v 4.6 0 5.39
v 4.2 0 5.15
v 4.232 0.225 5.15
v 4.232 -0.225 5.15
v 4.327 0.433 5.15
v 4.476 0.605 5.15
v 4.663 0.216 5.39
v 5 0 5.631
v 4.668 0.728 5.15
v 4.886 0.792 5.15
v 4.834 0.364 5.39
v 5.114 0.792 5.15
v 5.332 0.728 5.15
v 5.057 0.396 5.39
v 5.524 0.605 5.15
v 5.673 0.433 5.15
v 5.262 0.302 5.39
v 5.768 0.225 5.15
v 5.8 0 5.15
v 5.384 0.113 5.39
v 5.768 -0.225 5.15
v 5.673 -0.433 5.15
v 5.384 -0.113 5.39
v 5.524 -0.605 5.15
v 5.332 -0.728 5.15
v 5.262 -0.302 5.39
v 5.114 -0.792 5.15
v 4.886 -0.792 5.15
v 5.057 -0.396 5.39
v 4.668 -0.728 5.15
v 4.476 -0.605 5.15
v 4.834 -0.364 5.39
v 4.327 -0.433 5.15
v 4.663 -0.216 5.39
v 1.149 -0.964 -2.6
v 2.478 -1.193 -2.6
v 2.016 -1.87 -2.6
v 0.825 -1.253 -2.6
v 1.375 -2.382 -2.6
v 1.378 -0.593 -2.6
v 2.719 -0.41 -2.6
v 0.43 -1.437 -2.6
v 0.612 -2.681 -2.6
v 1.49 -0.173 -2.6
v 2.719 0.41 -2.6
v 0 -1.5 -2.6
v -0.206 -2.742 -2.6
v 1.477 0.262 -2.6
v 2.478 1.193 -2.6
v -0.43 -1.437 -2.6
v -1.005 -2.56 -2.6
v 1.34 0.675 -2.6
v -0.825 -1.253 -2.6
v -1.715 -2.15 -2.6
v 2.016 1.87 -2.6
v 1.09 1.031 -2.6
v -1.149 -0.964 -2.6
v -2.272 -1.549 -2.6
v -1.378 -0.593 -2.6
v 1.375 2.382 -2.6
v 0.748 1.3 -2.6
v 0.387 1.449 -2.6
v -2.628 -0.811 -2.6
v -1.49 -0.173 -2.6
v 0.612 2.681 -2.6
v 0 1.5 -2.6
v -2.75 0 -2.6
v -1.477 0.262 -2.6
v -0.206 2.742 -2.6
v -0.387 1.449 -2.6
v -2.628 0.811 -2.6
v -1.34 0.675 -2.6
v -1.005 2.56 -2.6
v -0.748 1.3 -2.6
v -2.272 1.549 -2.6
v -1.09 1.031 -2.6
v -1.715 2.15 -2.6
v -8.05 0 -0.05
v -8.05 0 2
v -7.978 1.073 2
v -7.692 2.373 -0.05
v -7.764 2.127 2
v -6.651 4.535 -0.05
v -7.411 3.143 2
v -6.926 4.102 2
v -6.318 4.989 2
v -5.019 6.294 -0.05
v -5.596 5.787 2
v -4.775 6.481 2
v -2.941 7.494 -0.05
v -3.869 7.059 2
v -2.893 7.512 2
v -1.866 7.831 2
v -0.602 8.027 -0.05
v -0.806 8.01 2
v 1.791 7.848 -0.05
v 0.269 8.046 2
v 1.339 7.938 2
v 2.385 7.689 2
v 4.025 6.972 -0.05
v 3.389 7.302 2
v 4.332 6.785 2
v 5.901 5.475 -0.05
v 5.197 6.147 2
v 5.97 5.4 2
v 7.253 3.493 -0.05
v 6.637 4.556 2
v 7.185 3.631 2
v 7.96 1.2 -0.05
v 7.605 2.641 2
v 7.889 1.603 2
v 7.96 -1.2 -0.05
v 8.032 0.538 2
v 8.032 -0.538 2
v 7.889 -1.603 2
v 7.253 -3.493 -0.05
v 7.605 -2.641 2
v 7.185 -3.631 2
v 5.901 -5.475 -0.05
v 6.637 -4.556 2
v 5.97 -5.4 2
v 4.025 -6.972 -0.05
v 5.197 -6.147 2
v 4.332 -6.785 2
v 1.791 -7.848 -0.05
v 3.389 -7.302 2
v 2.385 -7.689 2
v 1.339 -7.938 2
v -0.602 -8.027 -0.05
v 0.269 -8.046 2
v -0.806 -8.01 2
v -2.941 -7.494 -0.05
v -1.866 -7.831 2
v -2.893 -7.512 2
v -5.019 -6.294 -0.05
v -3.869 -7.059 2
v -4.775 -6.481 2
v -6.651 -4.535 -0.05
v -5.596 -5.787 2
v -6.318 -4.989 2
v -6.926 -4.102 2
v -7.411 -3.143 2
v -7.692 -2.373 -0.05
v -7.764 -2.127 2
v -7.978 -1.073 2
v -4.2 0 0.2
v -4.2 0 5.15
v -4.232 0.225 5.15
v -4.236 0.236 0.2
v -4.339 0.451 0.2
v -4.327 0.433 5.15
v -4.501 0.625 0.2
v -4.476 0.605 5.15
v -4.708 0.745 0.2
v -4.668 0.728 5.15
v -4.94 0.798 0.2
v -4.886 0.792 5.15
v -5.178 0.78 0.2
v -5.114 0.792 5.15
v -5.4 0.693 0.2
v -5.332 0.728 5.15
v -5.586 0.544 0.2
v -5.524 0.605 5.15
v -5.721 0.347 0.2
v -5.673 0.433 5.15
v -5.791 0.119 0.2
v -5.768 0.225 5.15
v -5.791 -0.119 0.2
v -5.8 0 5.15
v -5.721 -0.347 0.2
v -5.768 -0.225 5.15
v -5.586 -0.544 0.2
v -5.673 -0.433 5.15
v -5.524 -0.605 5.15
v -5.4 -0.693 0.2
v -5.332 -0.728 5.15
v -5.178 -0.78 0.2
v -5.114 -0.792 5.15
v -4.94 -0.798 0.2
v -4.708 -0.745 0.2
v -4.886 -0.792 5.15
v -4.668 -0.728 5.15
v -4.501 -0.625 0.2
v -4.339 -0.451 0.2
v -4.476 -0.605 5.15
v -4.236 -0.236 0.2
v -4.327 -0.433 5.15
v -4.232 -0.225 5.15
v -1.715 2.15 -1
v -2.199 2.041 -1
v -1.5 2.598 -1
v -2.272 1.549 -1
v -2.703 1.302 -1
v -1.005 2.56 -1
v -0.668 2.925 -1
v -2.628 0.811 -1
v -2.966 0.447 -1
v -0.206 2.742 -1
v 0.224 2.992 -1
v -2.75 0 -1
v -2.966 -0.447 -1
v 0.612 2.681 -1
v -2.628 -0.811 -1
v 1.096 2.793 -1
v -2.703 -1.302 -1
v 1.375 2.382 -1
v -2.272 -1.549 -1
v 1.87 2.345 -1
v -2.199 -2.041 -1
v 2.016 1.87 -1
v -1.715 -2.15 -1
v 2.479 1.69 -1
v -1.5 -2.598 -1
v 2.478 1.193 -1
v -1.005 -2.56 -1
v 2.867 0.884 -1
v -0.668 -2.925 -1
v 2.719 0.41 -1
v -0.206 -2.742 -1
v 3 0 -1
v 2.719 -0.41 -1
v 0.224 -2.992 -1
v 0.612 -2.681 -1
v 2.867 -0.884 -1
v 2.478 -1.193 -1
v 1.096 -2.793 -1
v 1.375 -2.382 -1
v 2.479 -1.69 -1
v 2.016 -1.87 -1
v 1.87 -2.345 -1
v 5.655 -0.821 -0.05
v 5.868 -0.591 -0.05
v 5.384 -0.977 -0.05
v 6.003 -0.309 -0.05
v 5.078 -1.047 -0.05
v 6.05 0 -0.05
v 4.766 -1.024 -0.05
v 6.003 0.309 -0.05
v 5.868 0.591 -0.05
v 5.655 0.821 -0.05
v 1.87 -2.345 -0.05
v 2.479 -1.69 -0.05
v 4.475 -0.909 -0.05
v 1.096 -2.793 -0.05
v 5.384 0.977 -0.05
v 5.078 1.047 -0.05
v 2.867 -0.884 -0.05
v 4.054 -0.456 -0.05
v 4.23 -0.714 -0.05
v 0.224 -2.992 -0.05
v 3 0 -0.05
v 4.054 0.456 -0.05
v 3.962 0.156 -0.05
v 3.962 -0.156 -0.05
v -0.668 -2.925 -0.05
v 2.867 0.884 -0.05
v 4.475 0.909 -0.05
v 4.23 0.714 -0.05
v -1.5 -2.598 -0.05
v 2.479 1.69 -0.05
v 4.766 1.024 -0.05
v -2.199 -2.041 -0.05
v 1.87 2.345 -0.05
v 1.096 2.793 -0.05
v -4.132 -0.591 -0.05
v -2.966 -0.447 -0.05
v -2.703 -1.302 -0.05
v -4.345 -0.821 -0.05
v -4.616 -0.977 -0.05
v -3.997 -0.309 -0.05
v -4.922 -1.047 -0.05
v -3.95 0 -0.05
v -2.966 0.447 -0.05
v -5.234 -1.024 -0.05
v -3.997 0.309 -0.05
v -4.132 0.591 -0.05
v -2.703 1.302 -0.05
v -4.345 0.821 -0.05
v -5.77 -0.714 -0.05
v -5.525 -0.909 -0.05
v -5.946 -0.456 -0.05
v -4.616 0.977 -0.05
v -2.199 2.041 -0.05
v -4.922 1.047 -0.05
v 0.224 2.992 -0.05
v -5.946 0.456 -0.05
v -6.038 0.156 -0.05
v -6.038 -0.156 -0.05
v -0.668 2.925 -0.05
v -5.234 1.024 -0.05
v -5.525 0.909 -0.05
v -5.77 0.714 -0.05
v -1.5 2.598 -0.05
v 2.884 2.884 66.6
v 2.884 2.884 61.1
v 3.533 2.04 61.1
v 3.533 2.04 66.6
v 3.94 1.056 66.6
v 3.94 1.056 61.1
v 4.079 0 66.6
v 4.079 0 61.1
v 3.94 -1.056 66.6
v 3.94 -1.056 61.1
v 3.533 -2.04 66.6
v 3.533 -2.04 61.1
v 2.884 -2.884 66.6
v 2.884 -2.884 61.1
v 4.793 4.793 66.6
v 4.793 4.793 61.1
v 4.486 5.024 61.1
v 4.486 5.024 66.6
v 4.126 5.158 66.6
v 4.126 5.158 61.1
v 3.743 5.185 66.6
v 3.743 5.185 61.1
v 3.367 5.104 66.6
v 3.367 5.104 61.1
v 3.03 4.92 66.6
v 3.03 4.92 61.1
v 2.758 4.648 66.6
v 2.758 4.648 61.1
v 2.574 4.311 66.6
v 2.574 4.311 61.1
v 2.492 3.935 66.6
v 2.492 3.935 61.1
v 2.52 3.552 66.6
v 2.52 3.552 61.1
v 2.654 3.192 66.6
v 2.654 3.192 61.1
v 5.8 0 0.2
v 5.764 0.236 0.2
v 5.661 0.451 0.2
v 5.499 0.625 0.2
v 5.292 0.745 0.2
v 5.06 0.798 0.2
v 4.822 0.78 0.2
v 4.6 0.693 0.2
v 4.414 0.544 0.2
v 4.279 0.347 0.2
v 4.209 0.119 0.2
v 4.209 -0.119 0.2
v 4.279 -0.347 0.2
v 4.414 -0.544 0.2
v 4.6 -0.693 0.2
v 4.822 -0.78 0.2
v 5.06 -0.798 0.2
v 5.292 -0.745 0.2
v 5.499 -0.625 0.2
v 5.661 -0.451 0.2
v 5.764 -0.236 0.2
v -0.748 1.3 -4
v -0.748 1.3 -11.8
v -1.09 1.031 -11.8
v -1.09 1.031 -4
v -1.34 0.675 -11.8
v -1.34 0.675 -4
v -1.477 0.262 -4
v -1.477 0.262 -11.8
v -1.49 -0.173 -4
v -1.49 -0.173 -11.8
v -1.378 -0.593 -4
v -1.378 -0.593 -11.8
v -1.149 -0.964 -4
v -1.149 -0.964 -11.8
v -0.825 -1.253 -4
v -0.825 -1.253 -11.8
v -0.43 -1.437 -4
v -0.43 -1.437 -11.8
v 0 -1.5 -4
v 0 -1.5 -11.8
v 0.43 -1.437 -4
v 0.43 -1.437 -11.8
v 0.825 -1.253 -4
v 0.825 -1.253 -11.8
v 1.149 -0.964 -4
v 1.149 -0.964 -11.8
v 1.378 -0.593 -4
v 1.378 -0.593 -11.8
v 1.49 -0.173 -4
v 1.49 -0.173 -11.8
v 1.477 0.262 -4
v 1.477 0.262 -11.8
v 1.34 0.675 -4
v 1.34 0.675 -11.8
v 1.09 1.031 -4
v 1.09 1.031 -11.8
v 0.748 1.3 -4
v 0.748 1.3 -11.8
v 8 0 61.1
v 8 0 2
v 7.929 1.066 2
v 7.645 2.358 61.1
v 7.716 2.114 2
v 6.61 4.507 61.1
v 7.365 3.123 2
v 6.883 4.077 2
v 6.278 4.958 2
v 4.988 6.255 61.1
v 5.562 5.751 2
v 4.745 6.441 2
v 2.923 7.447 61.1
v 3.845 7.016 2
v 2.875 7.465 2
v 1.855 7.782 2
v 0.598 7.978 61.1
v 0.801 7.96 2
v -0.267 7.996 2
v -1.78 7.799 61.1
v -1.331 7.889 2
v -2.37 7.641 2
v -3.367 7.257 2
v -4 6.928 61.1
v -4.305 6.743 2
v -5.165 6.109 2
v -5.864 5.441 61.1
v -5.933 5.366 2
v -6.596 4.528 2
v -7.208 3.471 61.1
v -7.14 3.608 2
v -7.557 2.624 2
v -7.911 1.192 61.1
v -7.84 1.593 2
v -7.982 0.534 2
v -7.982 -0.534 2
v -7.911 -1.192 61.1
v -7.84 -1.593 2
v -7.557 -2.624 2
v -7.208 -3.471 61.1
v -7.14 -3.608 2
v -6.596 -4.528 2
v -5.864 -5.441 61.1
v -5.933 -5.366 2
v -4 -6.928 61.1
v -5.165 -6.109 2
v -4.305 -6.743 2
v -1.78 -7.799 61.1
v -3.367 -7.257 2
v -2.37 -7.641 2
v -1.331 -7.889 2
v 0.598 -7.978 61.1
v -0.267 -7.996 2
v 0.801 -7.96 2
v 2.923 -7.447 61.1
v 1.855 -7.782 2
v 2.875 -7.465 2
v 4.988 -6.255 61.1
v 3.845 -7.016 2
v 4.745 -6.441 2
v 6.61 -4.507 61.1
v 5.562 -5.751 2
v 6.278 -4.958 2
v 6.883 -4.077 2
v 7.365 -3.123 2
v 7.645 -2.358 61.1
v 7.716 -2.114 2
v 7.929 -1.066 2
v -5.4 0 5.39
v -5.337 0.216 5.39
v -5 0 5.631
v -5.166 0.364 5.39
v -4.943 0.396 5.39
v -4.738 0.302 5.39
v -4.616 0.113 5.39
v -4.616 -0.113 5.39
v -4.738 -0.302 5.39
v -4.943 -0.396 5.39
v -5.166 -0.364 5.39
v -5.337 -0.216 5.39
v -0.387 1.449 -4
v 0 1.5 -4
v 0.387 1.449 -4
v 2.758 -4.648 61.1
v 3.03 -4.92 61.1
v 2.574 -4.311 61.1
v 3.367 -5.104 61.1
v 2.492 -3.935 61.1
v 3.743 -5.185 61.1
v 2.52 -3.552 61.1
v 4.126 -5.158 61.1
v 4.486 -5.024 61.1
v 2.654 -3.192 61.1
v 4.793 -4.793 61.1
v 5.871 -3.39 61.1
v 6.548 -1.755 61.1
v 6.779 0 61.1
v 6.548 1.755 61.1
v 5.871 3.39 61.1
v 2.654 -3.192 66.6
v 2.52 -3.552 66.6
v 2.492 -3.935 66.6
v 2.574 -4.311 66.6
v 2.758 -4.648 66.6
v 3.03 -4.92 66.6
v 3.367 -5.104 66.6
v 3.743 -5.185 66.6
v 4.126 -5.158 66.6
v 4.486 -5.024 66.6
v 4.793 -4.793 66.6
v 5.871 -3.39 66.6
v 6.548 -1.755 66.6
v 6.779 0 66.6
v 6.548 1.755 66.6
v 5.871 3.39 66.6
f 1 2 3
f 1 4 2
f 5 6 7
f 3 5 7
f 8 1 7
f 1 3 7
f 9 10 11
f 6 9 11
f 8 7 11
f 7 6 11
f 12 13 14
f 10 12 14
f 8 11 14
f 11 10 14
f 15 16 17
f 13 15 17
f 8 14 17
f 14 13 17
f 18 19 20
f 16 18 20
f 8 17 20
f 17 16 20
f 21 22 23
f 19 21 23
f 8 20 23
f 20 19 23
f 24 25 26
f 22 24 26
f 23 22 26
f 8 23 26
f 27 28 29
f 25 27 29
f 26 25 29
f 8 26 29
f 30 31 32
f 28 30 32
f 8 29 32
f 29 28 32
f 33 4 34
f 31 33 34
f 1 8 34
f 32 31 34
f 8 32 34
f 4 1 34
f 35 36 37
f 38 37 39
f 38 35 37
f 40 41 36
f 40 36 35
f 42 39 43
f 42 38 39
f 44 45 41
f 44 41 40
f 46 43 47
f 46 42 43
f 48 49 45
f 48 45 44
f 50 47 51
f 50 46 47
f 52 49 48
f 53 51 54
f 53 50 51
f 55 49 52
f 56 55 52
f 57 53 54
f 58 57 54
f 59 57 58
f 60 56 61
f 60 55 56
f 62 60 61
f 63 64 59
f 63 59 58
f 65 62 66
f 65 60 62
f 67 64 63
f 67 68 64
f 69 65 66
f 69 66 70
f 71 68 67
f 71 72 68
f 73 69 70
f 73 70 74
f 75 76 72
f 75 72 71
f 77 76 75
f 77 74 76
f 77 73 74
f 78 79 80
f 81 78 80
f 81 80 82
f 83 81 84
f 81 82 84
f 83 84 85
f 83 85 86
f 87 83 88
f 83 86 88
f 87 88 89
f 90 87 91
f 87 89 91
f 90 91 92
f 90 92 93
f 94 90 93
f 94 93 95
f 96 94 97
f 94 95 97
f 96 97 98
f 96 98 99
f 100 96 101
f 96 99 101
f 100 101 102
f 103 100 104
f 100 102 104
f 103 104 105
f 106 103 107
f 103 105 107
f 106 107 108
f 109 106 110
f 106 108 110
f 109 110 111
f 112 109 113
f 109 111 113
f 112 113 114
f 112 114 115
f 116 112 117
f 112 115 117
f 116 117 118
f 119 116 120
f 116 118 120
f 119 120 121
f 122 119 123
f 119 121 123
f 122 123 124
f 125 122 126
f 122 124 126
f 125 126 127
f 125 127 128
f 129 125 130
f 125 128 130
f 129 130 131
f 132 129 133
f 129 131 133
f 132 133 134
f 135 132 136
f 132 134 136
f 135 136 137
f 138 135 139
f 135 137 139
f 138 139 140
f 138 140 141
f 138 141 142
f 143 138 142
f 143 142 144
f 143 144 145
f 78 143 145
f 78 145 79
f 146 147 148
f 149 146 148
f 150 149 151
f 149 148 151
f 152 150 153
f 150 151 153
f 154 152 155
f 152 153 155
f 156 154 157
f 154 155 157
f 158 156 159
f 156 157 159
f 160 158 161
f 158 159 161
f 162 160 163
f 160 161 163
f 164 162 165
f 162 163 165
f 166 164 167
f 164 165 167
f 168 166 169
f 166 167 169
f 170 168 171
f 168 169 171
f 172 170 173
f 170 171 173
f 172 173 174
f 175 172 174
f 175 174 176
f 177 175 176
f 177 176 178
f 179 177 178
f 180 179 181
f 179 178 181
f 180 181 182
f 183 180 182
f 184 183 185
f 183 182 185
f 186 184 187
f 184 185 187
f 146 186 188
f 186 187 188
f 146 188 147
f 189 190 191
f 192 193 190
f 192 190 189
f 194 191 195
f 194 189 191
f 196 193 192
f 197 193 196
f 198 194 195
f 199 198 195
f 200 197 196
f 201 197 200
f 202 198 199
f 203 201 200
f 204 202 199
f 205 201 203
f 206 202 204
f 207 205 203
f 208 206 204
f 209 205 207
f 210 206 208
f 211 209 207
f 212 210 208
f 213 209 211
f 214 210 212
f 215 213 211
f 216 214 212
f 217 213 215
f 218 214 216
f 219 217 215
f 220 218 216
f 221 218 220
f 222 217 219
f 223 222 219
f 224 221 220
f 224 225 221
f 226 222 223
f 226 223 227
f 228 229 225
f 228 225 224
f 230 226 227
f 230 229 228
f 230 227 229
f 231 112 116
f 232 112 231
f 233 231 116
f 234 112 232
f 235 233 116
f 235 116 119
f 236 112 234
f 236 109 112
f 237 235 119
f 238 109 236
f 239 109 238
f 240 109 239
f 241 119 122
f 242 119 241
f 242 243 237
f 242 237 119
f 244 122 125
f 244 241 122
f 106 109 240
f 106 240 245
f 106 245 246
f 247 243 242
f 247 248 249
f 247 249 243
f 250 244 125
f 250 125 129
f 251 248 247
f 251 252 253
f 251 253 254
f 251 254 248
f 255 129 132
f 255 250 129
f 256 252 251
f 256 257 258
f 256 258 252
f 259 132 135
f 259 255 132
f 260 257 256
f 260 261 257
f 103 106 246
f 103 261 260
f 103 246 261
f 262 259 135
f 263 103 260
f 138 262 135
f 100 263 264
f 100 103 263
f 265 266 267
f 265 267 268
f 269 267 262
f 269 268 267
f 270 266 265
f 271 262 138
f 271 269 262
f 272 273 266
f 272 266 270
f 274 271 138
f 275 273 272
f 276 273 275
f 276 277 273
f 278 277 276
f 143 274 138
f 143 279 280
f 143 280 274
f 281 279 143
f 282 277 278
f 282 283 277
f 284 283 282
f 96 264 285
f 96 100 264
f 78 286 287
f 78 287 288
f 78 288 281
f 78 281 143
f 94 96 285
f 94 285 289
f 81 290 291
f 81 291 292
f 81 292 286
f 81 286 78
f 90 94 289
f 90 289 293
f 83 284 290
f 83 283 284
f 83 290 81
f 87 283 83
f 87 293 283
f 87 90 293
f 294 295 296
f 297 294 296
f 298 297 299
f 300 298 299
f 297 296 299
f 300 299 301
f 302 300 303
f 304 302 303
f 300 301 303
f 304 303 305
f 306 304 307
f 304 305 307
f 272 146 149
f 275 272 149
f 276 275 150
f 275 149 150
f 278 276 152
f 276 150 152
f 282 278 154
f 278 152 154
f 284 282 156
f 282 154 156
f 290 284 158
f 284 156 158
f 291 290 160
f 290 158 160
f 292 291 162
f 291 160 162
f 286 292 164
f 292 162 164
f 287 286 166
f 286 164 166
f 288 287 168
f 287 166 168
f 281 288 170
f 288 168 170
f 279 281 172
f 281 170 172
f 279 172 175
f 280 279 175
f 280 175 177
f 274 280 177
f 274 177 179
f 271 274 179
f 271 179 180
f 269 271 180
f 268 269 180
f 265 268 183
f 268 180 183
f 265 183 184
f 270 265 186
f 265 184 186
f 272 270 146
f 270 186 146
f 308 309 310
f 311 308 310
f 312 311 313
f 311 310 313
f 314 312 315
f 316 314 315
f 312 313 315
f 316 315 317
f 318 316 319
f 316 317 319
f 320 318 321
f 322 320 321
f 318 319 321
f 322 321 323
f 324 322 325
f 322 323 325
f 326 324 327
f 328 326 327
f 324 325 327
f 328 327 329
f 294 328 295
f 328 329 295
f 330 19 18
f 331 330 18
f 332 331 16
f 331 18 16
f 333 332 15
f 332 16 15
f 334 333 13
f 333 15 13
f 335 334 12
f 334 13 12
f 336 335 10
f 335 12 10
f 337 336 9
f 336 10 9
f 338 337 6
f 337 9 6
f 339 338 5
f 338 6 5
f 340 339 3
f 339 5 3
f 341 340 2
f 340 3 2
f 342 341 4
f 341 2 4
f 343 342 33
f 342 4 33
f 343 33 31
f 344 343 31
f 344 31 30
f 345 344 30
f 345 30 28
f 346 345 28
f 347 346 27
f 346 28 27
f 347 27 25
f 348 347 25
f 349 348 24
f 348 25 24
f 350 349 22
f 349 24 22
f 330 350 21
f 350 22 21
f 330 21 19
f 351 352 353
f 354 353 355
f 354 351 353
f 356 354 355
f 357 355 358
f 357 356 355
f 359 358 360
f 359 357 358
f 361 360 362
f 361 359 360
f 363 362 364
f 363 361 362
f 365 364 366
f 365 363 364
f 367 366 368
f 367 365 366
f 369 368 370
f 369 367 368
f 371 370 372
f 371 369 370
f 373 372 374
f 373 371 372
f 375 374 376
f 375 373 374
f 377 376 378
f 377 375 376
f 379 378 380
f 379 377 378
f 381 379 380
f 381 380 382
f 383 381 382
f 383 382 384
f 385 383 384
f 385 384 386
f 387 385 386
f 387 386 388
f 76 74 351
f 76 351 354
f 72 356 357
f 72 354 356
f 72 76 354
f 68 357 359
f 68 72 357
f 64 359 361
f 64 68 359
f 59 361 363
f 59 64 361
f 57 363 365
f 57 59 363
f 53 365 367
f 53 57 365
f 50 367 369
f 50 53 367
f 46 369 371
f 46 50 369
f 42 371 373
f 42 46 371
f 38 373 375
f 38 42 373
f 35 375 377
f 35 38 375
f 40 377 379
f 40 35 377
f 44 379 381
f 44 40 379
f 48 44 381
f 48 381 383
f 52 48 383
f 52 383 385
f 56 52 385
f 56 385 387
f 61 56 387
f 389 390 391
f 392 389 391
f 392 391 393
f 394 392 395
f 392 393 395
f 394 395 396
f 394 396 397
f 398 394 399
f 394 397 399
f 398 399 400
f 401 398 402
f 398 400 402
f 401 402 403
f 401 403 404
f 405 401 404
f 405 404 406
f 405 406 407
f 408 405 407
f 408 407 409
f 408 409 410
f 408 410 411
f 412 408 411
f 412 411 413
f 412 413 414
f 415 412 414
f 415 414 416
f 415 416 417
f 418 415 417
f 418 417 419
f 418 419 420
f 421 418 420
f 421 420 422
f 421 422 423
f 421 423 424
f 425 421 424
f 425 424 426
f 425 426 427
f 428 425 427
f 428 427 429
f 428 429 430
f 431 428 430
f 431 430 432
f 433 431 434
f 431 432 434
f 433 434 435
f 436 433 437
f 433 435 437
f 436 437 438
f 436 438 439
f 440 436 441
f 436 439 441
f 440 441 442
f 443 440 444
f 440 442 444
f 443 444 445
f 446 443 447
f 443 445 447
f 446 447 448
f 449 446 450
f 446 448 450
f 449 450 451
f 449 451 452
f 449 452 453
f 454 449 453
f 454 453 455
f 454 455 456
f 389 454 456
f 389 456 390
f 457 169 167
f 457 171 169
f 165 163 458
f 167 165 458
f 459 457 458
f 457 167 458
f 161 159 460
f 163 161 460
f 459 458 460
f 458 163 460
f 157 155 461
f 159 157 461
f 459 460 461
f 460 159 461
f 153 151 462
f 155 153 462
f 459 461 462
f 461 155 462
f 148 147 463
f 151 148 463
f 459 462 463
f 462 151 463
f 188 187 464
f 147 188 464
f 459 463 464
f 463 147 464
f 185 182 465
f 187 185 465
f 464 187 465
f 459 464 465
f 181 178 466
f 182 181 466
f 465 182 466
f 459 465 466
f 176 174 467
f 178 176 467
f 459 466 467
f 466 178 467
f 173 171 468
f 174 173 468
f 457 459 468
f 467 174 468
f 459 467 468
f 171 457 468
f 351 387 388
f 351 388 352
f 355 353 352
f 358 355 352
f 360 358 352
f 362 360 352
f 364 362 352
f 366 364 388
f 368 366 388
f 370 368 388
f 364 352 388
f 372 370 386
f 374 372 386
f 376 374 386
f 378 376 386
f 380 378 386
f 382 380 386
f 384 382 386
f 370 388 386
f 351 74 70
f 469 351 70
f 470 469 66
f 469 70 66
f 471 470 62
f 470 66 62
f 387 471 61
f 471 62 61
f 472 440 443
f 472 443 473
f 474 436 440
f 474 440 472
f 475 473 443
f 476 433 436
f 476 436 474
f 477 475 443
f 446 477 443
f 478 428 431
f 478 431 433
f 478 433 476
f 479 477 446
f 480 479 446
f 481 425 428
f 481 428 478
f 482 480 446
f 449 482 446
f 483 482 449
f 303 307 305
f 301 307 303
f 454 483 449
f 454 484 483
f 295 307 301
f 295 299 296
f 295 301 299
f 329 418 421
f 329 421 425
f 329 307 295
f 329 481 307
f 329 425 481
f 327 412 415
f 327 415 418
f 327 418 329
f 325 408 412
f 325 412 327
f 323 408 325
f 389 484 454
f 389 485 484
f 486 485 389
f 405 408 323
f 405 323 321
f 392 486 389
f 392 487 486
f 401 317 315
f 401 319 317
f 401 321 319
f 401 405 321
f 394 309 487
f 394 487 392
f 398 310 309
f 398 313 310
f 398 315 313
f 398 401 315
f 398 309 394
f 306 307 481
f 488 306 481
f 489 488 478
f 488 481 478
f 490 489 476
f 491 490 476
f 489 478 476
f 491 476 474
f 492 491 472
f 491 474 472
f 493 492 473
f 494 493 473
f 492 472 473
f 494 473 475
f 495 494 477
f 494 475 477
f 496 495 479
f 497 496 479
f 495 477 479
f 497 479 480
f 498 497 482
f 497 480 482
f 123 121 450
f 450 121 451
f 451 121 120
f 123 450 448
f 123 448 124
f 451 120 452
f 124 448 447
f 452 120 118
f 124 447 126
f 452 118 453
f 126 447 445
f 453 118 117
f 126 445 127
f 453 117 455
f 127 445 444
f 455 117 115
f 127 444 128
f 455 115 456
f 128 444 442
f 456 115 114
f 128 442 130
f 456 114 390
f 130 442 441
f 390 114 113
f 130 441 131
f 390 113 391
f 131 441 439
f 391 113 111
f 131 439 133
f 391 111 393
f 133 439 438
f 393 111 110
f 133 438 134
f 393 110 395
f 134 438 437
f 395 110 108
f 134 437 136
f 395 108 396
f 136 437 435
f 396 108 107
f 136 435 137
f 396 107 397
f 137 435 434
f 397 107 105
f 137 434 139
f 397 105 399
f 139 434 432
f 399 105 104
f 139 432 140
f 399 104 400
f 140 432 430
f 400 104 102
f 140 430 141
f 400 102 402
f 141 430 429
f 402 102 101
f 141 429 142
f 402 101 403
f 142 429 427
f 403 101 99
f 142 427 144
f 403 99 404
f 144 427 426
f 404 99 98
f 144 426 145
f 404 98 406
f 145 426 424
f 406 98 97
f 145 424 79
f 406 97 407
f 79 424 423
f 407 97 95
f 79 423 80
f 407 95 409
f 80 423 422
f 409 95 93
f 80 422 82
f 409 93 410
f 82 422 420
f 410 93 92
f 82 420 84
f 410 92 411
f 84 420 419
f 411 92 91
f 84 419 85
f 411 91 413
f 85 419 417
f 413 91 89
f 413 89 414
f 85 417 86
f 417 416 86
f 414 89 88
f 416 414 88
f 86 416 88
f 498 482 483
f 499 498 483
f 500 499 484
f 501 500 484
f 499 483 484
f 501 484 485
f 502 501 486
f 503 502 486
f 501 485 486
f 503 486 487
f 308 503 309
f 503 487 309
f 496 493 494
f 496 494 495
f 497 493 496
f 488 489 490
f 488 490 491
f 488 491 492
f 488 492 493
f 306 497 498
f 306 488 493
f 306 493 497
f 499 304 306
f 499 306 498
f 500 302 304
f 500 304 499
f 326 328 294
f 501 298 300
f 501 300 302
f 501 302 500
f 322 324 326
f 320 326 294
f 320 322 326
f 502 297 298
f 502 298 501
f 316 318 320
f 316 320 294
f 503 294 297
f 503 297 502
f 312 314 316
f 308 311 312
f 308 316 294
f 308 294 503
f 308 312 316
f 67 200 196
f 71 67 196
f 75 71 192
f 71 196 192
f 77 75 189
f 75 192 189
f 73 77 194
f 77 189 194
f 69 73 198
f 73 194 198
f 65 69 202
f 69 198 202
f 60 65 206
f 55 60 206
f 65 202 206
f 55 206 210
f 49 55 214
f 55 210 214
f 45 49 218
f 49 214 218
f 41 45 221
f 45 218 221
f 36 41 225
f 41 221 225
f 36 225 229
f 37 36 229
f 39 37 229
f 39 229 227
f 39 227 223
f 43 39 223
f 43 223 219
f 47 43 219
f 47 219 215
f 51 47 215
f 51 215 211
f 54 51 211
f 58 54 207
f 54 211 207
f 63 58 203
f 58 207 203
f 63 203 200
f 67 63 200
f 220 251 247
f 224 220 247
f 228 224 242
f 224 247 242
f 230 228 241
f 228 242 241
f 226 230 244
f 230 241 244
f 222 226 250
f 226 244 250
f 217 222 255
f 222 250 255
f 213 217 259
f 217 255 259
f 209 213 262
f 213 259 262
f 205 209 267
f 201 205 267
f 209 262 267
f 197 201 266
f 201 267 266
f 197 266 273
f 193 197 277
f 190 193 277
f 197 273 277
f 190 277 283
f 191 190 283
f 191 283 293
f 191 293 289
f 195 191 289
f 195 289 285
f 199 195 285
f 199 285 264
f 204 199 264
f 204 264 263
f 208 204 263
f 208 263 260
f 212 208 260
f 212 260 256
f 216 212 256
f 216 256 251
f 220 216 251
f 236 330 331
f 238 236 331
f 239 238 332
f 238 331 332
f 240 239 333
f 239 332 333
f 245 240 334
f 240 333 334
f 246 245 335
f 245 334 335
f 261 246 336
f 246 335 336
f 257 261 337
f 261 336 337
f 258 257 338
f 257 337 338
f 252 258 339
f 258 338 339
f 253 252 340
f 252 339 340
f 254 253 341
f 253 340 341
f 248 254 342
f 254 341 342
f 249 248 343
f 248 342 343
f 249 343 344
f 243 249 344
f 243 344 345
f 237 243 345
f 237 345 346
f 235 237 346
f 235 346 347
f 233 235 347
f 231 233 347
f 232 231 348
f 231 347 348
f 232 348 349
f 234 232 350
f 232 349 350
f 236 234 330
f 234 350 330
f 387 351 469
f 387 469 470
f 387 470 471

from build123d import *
from build123d.topology import SkipClean

# Parameters (mm, degrees)
SKETCH_1_R             = 8
EXTRUDE_1_DEPTH        = 61.1
EXTRUDE_2_DEPTH        = 11.8
SKETCH_3_R             = 3
EXTRUDE_3_DEPTH        = 1
SKETCH_4_R             = 2.75
EXTRUDE_4_DEPTH        = 1.6
EXTRUDE_5_DEPTH        = 0.05
EXTRUDE_5_DEPTH_BACK   = 2
SKETCH_5_R             = 8.05
HOLE_WIZARD_M2_1_D     = 1.6
HOLE_WIZARD_M2_1_DEPTH = 5.2
HOLE_WIZARD_M2_1_TIP   = 0.480688495
CHAMFER_1_SIZE         = 0.25
SKETCH1_R              = 1.5
EXTRUDE1_DEPTH         = 1.4
EXTRUDE2_DEPTH         = 5.5


with BuildPart() as part:
    # 草图1 → 拉伸1 (new body)
    with BuildSketch(Plane.XY):
        Circle(SKETCH_1_R)
    extrude(amount=EXTRUDE_1_DEPTH)

    # 草图2 → 拉伸2 (add)
    with BuildSketch(Plane(origin=(0, 0, 0), x_dir=(-1, 0, 0), z_dir=(0, 0, -1))):
        with BuildLine():
            Line((-0.748331477, 1.3), (0.748331477, 1.3))
            ThreePointArc((0.748331477, 1.3), (0, -1.5), (-0.748331477, 1.3))
        make_face()
    extrude(amount=EXTRUDE_2_DEPTH)

    # 草图3 → 拉伸3 (add)
    with BuildSketch(Plane(origin=(0, 0, 0), x_dir=(-1, 0, 0), z_dir=(0, 0, -1))):
        with Locations(Location((0, 0, 0), (0, 0, 180))):
            Circle(SKETCH_3_R)
    extrude(amount=EXTRUDE_3_DEPTH)

    # 草图4 → 拉伸4 (add)
    with BuildSketch(Plane(origin=(0, 0, -1), x_dir=(-1, 0, 0), z_dir=(0, 0, -1))):
        Circle(SKETCH_4_R)
    extrude(amount=EXTRUDE_4_DEPTH)

    # 草图5 → 拉伸5 (add, two sides: drawn at the far end of the back side and taken through both)
    with BuildSketch(Plane(origin=(0, 0, 0), x_dir=(-1, 0, 0), z_dir=(0, 0, -1)).offset(-EXTRUDE_5_DEPTH_BACK)):
        Circle(SKETCH_5_R)
    extrude(amount=EXTRUDE_5_DEPTH + EXTRUDE_5_DEPTH_BACK)

    # M2 螺纹孔1
    with Locations(Plane(origin=(5, 0, -0.05), x_dir=(-1, 0, 0), z_dir=(0, 0, -1))):
        with Locations((0, 0), (10, 0)):
            Hole(HOLE_WIZARD_M2_1_D / 2, depth=HOLE_WIZARD_M2_1_DEPTH)
            with Locations((0, 0, -(HOLE_WIZARD_M2_1_DEPTH + HOLE_WIZARD_M2_1_TIP / 2))):  # 118° drill point
                Cone(0, HOLE_WIZARD_M2_1_D / 2, HOLE_WIZARD_M2_1_TIP, mode=Mode.SUBTRACT)

    # 倒角1
    chamfer_1_edges = [part.edges().sort_by_distance(p)[0] for p in [
        (-5.8, 0, -0.05),
        (4.2, 0, -0.05),
    ]]
    chamfer(chamfer_1_edges, length=CHAMFER_1_SIZE)

    # Sketch1 → Extrude1 (add)
    with SkipClean():  # the faces are left unmerged after this step: merging them gives an invalid solid
        with BuildSketch(Plane(origin=(0, 0, -2.6), x_dir=(-1, 0, 0), z_dir=(0, 0, -1))):
            with Locations(Location((0, 0, 0), (0, 0, 119.926434867))):
                Circle(SKETCH1_R)
        extrude(amount=EXTRUDE1_DEPTH)

    # Sketch2 → Extrude2 (add)
    with SkipClean():  # the faces are left unmerged after this step: merging them gives an invalid solid
        with BuildSketch(Plane.XY.offset(61.1)):
            with BuildLine():
                ThreePointArc((4.793495579, -4.793495579), (6.779026459, 0), (4.793495579, 4.793495579))
                ThreePointArc((4.793495579, 4.793495579), (2.88430727, 4.793495579), (2.88430727, 2.88430727))
                ThreePointArc((2.88430727, 2.88430727), (4.079026459, 0), (2.88430727, -2.88430727))
                ThreePointArc((2.88430727, -2.88430727), (2.88430727, -4.793495579), (4.793495579, -4.793495579))
            make_face()
        extrude(amount=EXTRUDE2_DEPTH)


solid = part.part
